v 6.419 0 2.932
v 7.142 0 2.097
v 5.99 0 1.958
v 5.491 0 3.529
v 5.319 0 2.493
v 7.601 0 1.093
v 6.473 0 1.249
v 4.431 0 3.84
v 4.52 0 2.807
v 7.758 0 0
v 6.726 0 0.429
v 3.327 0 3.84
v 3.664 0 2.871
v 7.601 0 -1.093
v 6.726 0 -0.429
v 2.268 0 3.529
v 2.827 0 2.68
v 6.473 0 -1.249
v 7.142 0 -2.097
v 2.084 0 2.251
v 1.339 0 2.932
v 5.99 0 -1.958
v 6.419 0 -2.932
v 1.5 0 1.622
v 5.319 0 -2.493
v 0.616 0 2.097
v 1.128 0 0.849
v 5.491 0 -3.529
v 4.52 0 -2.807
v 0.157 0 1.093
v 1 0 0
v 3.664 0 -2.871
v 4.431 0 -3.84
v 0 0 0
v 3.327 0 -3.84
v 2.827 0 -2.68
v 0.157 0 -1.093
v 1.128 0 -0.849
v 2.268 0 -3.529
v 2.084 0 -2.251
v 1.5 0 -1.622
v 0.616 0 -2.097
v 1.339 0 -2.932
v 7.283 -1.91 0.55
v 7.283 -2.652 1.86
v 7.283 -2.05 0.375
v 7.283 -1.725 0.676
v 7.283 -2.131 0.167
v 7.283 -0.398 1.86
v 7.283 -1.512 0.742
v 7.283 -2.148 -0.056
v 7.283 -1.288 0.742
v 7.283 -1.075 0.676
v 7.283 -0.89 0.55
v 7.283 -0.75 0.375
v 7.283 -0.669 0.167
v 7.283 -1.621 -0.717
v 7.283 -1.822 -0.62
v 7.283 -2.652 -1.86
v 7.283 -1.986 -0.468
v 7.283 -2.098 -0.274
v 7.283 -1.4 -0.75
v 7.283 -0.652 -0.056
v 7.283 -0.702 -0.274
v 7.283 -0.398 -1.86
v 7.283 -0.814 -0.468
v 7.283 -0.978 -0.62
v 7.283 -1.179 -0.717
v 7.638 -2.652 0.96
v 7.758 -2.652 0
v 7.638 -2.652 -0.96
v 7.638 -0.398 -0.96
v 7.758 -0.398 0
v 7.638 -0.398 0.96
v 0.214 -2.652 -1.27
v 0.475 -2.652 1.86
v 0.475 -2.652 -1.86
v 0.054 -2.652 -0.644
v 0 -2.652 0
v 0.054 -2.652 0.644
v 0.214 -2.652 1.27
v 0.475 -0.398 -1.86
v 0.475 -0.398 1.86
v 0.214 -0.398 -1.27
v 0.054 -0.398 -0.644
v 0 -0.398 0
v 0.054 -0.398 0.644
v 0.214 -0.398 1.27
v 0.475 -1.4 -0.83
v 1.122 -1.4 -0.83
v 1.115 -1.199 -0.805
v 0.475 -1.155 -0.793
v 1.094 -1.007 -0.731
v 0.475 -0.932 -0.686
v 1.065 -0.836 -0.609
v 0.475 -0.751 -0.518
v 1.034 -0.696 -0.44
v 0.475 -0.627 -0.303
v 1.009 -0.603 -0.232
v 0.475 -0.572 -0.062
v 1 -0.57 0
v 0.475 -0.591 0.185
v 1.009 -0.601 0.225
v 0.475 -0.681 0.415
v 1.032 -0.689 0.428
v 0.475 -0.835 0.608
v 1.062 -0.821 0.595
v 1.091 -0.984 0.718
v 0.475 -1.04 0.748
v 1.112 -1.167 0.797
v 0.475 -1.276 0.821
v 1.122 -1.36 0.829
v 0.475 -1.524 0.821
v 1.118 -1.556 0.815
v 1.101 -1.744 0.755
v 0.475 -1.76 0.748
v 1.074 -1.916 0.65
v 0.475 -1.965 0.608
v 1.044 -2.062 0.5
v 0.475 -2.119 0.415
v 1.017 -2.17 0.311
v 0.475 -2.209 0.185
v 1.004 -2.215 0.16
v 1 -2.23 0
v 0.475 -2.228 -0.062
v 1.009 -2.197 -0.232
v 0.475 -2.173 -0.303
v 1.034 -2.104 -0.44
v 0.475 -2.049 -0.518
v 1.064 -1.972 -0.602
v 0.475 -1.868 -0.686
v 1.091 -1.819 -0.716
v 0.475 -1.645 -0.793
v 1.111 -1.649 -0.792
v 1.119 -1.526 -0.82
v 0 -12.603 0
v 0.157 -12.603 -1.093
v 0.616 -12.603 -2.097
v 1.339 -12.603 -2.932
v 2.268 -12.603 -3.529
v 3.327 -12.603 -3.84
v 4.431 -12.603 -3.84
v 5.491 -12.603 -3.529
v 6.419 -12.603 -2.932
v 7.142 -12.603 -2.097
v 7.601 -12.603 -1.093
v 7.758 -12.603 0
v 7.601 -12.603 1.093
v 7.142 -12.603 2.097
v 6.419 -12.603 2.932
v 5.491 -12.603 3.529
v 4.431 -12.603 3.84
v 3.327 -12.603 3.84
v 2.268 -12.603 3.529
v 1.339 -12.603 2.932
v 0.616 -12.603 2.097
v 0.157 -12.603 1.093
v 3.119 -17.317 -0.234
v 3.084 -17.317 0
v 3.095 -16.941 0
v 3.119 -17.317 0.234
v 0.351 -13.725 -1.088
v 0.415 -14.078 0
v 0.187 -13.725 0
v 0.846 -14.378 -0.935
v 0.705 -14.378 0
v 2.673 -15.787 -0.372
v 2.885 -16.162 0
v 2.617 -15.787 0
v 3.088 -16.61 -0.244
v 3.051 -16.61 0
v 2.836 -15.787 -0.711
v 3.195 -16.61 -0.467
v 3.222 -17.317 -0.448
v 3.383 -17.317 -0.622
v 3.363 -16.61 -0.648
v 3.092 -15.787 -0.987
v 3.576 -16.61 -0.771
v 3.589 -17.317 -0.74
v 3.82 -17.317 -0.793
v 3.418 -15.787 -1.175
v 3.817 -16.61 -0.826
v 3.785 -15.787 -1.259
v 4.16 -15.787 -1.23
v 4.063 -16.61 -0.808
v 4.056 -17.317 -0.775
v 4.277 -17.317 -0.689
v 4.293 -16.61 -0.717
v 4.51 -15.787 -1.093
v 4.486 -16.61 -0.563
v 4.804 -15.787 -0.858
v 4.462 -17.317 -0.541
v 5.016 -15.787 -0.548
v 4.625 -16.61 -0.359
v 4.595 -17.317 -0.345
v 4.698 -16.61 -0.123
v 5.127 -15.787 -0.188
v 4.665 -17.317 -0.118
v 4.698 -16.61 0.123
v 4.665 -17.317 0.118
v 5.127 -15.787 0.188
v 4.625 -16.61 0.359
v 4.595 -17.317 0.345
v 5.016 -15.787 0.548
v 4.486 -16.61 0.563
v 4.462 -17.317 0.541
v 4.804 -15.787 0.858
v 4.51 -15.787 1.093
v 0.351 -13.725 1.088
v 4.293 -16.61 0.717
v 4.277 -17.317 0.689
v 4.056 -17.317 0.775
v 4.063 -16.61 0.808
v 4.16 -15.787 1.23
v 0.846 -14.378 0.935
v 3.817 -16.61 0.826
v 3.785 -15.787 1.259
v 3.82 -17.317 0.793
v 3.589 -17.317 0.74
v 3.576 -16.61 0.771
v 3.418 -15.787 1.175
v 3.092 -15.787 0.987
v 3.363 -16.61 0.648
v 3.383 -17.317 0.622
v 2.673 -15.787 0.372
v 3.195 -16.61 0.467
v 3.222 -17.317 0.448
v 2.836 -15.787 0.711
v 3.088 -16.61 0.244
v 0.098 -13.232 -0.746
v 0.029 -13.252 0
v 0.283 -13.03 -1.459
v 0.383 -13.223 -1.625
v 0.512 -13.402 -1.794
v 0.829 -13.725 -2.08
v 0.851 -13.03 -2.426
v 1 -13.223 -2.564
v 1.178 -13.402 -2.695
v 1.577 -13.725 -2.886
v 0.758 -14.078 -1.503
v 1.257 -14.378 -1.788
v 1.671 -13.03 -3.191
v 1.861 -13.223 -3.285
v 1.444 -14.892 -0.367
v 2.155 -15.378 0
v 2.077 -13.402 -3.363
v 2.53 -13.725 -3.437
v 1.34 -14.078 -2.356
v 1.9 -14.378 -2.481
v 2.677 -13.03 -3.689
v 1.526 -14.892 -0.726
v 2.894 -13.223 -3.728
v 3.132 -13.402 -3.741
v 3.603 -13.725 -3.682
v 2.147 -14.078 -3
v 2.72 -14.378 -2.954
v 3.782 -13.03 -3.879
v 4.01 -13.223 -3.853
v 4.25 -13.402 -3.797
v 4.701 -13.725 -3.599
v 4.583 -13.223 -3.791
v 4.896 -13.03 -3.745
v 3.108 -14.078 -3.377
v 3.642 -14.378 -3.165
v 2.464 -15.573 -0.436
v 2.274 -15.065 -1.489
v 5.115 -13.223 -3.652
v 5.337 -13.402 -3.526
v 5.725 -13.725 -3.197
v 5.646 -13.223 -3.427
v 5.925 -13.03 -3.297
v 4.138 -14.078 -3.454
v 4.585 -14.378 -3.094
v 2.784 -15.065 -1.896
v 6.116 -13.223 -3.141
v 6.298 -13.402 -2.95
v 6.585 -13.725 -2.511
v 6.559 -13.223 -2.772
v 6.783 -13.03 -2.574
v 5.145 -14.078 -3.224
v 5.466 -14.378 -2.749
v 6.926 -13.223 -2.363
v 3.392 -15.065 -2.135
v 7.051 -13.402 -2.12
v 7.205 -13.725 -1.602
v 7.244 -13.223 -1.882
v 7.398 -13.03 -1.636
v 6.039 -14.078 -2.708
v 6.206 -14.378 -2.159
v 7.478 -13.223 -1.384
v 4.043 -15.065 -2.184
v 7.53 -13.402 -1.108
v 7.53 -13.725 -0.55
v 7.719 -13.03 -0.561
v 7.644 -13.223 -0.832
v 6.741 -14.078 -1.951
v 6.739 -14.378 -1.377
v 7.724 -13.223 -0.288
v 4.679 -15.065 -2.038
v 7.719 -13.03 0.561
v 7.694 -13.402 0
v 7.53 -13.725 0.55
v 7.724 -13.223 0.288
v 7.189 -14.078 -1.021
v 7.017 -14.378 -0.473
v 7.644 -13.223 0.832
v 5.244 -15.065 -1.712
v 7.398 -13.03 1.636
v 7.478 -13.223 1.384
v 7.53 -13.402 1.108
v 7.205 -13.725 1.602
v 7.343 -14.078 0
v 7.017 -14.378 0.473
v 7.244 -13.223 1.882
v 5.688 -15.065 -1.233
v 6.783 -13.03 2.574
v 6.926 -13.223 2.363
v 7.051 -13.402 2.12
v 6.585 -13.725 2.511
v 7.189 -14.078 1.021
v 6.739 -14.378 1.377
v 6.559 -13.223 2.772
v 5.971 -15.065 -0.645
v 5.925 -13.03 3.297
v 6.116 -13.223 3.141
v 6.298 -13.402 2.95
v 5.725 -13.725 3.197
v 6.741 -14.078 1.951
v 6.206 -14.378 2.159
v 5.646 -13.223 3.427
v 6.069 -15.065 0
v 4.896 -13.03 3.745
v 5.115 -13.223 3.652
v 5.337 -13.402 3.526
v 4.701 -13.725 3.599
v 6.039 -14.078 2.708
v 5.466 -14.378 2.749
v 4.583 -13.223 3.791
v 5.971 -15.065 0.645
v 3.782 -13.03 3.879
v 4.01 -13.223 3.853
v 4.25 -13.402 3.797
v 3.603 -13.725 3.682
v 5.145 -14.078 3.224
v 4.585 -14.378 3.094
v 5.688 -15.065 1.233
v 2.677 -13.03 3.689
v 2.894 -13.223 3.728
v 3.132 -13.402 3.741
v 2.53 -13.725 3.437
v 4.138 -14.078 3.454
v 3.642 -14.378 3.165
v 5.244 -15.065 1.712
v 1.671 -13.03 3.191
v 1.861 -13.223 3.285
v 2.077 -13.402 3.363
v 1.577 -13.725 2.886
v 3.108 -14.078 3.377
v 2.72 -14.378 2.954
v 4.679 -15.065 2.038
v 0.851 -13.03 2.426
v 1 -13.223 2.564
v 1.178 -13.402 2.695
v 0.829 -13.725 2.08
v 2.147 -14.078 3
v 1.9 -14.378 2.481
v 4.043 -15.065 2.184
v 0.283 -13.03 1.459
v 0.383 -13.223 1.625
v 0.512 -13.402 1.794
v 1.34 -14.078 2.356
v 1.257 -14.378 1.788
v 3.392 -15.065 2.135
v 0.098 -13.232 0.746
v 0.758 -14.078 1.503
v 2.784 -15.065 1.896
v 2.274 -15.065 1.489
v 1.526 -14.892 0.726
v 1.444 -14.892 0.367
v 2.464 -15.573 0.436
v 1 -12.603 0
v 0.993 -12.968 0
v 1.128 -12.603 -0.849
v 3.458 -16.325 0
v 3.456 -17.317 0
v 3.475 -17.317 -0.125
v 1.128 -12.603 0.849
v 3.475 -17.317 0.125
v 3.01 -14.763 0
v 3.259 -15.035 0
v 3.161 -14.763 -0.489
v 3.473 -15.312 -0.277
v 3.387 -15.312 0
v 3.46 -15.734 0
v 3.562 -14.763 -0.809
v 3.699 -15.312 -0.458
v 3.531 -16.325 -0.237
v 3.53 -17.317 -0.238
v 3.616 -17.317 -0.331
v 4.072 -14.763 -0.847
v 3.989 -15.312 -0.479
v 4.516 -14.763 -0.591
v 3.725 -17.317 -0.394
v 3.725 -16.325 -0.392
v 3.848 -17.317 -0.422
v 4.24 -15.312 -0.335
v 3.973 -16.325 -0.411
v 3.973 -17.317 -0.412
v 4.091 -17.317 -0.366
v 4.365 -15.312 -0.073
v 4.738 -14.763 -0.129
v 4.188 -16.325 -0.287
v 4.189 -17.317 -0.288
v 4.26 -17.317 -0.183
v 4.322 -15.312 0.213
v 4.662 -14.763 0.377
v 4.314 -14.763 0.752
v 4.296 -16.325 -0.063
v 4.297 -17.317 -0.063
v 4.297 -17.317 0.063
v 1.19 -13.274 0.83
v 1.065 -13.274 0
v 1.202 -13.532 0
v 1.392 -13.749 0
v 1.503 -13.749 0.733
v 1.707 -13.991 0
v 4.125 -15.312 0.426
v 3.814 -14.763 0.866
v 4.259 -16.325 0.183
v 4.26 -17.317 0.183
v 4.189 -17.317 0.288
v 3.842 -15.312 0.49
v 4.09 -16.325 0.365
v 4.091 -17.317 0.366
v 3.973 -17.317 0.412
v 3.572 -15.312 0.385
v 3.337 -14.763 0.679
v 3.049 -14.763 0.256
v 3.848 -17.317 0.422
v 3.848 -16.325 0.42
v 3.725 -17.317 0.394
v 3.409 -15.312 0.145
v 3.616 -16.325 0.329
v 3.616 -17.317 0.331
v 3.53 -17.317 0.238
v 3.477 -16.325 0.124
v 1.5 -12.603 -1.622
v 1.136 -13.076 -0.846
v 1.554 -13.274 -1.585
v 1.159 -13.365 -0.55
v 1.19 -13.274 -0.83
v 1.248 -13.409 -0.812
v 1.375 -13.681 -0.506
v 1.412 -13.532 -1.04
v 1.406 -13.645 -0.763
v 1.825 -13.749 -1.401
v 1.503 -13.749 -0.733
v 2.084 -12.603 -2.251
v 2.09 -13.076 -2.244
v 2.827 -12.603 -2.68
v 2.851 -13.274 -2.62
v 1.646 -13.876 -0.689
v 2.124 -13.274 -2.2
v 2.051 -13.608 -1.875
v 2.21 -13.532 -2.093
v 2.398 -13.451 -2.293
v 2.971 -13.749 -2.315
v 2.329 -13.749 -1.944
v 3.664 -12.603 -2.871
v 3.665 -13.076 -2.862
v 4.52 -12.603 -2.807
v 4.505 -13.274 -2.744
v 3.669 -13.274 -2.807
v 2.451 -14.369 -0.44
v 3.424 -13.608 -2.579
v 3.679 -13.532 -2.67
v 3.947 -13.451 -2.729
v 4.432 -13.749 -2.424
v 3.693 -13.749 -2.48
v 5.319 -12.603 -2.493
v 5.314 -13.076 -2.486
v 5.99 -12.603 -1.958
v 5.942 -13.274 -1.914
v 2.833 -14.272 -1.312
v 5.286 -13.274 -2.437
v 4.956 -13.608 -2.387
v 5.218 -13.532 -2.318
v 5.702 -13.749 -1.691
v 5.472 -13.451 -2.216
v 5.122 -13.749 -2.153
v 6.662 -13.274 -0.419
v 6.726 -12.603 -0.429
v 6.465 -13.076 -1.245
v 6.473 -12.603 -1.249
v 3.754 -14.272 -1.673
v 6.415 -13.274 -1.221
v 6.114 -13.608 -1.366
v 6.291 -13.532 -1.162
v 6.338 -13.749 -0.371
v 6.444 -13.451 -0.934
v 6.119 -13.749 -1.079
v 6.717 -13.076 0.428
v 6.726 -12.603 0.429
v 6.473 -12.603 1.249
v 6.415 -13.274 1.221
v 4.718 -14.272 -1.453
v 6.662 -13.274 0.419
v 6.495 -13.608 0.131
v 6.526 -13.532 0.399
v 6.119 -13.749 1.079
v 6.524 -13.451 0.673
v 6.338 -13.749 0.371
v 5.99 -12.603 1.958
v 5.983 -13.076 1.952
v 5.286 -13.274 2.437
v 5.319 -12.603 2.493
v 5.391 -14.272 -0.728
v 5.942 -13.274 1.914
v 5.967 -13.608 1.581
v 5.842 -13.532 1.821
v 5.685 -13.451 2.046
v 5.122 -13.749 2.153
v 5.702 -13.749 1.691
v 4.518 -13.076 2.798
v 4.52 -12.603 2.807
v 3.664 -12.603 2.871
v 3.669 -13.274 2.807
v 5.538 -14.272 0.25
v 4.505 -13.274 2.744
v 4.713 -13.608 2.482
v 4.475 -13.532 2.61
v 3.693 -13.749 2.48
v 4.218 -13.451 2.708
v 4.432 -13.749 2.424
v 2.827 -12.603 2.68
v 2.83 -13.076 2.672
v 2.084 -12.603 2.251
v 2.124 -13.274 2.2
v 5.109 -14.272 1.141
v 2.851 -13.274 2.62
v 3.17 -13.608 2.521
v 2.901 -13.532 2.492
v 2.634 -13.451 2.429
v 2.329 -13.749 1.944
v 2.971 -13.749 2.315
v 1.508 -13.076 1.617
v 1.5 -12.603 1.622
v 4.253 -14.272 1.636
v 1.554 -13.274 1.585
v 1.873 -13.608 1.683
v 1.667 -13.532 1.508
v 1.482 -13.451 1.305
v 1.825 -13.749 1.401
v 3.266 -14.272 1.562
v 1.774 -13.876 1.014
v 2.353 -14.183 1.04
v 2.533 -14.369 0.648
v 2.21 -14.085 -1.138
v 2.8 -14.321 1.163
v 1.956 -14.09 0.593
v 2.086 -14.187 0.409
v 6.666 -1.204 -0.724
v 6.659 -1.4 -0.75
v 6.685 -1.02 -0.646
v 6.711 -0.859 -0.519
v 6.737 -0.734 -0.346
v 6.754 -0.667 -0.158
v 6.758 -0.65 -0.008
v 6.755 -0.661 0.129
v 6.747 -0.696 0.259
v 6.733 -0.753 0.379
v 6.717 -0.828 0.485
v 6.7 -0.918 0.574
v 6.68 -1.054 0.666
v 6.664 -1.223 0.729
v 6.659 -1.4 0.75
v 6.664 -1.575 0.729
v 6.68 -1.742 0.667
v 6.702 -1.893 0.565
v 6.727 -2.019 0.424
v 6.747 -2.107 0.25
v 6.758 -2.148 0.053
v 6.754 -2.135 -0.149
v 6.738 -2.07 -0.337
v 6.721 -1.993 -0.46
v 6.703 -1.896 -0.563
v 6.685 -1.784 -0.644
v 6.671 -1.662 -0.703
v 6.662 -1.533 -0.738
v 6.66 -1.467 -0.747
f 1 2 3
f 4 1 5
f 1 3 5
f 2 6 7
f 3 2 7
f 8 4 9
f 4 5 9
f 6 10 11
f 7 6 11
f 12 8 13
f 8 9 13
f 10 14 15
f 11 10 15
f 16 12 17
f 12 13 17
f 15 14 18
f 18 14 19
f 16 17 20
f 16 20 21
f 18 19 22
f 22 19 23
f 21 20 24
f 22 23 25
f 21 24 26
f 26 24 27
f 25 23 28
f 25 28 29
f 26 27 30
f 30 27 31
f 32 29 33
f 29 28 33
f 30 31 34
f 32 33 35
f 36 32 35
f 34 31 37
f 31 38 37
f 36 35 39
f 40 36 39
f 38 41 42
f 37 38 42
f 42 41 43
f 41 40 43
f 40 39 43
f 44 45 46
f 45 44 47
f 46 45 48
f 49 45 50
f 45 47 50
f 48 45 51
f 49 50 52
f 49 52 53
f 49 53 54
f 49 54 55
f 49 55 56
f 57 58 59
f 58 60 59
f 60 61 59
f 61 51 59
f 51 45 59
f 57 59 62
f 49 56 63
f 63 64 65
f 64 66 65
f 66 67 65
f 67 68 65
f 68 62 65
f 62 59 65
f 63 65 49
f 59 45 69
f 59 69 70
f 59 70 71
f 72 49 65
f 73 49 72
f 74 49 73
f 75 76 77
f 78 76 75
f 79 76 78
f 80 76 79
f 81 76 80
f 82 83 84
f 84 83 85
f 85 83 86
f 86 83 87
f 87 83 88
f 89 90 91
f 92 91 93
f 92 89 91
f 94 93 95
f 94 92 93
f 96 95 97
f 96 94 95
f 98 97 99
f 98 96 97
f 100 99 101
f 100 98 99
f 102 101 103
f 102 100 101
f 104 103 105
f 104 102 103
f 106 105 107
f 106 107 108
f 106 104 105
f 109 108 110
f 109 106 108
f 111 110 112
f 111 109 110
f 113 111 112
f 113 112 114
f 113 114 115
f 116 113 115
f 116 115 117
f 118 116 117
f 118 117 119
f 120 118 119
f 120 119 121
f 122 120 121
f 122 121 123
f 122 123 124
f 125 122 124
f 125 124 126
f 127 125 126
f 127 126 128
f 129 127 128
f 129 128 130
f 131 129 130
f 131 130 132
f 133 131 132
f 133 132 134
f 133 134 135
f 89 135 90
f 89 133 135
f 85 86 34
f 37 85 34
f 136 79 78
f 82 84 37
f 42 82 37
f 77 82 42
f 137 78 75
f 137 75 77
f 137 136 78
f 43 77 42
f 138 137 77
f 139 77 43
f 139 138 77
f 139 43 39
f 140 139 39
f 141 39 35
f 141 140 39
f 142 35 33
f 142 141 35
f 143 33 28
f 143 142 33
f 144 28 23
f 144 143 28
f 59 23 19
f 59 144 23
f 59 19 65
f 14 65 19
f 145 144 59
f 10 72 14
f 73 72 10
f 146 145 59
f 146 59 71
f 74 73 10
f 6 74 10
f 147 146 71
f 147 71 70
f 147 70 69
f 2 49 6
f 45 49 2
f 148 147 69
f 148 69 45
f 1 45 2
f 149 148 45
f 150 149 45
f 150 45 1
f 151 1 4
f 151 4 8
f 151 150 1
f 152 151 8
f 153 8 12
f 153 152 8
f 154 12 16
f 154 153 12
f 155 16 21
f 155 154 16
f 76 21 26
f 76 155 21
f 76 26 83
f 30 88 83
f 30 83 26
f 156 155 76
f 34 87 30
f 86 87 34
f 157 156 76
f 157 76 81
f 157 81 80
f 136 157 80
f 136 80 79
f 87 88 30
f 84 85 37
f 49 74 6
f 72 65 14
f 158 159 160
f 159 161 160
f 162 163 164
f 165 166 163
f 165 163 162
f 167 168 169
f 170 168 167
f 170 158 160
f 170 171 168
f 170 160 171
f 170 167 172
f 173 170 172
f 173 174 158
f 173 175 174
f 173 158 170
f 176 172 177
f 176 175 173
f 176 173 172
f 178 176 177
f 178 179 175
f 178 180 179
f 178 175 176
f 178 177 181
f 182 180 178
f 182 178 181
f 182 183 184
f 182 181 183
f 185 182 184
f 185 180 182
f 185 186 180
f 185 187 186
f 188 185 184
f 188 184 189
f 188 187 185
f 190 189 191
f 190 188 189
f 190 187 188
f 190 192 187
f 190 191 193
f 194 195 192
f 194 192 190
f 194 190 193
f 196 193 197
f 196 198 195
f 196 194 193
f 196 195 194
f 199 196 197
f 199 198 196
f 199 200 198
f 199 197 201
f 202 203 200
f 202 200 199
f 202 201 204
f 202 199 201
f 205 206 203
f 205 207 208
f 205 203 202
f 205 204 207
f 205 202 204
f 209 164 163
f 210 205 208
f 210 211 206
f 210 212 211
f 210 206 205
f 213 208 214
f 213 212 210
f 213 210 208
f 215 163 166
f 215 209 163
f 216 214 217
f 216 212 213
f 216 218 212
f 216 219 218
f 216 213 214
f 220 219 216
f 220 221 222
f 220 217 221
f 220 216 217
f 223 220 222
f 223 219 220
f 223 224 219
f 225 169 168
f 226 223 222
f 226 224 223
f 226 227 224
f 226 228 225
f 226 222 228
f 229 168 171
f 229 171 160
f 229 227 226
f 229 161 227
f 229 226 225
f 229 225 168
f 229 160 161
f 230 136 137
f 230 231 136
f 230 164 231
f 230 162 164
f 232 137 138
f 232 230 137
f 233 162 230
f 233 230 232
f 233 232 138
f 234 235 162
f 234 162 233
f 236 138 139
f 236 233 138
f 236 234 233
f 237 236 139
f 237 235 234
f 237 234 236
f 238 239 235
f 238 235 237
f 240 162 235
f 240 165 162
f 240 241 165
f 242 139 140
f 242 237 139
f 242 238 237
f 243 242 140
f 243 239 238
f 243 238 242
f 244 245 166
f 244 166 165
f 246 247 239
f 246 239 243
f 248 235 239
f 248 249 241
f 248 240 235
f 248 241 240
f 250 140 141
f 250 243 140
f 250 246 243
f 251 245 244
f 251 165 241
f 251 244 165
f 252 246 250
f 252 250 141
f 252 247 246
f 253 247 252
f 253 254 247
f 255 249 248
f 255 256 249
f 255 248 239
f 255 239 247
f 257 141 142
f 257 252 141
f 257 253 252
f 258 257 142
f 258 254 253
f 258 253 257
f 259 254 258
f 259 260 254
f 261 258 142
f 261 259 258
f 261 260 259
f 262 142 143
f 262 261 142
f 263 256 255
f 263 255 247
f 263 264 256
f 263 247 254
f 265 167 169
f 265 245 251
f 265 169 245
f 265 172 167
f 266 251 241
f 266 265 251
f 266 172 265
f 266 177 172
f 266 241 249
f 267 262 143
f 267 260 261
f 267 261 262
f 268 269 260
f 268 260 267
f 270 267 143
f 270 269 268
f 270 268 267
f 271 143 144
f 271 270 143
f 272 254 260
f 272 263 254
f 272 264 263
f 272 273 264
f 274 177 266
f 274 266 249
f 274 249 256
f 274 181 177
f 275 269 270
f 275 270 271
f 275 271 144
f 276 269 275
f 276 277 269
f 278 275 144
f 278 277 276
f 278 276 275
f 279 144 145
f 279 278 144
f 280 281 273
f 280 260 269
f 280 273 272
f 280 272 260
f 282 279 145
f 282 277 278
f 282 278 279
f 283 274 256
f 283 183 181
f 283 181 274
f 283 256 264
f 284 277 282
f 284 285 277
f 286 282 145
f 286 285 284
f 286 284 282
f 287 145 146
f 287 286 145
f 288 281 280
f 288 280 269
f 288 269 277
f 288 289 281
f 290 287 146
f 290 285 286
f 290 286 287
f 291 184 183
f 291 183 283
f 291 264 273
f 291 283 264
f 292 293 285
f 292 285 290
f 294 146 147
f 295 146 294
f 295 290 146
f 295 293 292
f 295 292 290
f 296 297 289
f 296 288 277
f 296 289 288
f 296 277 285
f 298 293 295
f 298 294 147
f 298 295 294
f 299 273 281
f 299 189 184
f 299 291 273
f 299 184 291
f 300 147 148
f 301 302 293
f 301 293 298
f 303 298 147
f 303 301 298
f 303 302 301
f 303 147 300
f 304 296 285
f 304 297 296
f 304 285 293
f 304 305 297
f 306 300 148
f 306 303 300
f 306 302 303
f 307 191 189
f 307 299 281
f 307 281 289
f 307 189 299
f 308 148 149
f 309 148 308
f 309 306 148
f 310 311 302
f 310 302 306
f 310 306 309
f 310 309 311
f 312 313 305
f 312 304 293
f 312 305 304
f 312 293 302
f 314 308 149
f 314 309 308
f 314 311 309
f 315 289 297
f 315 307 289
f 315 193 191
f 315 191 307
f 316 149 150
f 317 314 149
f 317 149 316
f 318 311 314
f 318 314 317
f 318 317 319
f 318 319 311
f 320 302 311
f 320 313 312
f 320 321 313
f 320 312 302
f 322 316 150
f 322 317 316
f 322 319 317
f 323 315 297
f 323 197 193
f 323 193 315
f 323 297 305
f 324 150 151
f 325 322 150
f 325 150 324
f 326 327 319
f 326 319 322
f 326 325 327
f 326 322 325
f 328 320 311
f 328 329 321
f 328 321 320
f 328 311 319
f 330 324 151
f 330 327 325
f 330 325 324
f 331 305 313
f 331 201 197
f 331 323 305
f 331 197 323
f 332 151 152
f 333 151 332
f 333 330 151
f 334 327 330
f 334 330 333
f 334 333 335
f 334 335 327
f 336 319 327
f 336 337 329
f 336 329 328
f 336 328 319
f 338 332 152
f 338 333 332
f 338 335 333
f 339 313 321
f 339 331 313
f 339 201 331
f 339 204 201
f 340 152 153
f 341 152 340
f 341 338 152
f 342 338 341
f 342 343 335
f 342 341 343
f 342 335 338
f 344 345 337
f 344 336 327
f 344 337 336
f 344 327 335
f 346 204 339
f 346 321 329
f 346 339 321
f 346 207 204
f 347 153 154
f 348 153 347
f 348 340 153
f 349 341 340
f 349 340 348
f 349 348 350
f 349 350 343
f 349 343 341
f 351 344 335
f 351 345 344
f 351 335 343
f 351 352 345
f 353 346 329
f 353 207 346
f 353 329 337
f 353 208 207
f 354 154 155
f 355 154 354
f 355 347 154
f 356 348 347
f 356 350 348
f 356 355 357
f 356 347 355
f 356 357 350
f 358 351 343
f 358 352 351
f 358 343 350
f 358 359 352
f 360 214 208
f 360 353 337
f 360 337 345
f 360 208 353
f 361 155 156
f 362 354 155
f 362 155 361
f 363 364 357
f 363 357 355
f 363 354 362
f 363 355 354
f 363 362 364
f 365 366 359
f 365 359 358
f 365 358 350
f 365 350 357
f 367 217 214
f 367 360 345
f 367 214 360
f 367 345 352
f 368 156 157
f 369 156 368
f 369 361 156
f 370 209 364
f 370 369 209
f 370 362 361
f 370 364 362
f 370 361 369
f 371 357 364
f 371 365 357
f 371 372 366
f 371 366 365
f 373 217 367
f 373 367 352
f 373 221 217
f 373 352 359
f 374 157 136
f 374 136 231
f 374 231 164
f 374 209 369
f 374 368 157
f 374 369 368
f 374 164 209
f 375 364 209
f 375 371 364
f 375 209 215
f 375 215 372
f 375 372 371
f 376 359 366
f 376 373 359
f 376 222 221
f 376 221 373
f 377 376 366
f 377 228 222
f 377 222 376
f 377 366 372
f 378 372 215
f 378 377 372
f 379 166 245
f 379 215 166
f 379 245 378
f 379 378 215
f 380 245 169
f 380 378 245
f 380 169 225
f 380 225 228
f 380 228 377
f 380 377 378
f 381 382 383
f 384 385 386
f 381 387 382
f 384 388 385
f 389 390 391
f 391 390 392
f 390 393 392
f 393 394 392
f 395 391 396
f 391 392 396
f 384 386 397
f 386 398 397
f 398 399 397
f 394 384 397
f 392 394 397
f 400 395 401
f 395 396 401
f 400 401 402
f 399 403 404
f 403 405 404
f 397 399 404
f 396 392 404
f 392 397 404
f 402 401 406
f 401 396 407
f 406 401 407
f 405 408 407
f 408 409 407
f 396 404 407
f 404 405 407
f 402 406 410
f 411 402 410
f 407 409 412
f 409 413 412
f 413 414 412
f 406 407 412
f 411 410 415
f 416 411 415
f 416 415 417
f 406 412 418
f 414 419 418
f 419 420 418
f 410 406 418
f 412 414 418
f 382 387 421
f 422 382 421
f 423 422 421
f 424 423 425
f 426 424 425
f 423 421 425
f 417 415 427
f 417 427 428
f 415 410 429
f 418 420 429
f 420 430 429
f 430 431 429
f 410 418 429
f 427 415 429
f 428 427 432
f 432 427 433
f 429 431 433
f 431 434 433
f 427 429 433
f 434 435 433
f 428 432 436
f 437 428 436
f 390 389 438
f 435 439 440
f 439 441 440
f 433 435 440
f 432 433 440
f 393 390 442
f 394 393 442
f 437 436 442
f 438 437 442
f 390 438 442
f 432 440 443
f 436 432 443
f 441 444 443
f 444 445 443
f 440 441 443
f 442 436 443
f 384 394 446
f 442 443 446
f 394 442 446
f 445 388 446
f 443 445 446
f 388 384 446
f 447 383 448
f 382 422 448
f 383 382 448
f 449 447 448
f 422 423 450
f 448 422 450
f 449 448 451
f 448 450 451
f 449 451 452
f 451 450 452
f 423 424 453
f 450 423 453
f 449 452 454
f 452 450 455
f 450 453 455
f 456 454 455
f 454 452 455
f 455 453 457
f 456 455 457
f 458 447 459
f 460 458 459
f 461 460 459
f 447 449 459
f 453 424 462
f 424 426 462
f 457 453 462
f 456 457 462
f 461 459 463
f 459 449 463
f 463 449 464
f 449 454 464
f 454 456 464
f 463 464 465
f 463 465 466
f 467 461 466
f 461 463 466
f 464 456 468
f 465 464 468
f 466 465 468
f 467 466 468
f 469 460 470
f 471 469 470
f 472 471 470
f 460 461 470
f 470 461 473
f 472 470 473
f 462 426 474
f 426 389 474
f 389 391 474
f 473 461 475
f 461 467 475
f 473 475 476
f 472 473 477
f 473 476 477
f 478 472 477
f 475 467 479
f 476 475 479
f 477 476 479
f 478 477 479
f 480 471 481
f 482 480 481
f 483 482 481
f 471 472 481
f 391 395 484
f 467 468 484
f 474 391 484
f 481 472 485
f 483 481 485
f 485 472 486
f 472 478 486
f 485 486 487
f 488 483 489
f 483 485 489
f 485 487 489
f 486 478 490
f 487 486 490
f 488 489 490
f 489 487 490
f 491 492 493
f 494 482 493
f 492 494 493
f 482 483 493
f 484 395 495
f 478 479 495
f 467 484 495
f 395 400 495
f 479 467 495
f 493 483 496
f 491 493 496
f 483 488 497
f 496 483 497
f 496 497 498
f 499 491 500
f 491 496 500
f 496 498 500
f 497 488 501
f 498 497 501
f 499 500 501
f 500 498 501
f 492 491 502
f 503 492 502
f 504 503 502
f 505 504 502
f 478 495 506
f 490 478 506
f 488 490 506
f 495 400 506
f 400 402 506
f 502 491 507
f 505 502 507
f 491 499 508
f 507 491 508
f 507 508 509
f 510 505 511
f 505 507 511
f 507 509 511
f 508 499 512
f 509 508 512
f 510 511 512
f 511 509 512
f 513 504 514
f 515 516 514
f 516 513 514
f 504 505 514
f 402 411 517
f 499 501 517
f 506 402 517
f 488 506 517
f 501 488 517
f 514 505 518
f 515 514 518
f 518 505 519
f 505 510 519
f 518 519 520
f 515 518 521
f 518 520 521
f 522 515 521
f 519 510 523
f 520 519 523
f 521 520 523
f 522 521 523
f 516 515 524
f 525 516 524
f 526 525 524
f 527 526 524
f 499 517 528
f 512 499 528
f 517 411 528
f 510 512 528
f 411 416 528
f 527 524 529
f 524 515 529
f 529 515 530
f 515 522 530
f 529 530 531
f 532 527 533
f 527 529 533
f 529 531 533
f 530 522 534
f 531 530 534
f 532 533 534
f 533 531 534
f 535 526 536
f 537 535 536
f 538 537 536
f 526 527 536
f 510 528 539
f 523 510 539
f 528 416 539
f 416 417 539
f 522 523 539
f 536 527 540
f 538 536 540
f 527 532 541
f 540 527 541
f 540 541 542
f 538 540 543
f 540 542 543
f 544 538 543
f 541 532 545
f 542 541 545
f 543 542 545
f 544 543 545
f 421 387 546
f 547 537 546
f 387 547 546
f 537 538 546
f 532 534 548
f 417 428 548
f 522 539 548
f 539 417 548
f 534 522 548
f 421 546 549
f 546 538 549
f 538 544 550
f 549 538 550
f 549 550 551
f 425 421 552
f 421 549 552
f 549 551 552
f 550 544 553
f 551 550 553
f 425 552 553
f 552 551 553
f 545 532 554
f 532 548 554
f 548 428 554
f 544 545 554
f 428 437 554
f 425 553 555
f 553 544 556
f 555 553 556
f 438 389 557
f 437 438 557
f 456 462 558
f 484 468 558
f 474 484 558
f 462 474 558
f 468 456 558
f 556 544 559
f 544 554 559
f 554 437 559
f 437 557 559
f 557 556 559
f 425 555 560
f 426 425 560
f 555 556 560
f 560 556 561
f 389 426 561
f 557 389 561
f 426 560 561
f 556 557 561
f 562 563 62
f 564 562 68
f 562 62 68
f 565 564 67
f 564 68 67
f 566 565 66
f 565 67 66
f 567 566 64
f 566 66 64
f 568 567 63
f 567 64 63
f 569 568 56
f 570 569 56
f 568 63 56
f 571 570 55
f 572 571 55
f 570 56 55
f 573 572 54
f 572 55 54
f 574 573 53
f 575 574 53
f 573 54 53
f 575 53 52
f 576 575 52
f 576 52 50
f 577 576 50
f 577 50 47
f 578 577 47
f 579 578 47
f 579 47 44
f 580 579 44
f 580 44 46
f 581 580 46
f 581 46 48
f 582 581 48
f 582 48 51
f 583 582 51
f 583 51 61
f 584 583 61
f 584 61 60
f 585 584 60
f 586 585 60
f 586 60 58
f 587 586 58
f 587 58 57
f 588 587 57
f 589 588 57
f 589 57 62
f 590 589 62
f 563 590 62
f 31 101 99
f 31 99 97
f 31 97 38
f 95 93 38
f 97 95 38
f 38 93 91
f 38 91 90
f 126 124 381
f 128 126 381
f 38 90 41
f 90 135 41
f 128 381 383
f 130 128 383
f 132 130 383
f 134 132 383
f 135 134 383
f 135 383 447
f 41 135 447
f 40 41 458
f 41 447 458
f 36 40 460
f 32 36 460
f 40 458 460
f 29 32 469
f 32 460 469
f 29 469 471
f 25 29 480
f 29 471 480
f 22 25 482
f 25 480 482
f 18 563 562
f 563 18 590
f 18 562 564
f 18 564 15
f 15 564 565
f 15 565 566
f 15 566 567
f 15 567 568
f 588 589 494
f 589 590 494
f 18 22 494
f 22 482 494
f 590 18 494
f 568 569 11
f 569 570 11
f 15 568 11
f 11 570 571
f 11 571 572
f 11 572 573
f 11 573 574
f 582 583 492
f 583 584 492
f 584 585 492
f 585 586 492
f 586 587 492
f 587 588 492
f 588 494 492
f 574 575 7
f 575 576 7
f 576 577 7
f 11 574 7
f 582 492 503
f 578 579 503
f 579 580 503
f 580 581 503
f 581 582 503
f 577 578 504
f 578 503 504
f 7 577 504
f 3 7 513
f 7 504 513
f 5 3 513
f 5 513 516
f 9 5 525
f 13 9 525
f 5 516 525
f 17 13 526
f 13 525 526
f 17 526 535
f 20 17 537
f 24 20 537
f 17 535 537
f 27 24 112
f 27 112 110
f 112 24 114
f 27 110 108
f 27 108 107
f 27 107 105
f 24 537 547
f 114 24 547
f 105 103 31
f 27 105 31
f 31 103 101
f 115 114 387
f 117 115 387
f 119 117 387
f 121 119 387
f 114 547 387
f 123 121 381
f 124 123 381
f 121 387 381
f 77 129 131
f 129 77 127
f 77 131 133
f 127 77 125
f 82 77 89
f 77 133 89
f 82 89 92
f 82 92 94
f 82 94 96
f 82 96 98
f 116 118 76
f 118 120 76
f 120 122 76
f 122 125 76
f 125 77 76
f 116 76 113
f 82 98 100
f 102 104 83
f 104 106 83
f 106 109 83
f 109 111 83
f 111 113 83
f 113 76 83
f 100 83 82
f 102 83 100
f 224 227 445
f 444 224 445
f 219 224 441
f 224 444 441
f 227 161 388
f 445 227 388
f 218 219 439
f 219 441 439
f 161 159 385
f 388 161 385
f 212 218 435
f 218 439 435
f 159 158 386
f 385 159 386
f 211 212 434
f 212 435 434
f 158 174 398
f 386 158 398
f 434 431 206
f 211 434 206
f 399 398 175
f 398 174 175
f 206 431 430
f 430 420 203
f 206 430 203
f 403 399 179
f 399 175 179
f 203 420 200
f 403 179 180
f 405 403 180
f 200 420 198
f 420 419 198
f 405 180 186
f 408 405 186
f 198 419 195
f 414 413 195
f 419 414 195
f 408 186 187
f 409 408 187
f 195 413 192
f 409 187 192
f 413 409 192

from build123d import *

# Parameters (mm, degrees)
CUT_EXTRUDE1_DEPTH      = 20.373272444
CUT_EXTRUDE1_DEPTH_BACK = 5
SKETCH3_R               = 0.75
SKETCH5_R               = 0.830043706
CUT_EXTRUDE3_DEPTH      = 5
CUT_EXTRUDE4_DEPTH      = 10
CUT_EXTRUDE4_DEPTH_BACK = 10
SKETCH6_W               = 0.475158235
SKETCH6_H               = 2.253950387
SKETCH6_W_2             = 0.475158234


with BuildPart() as part:
    # Sketch1 → Revolve1 (revolve)
    with BuildSketch(Plane.XY):
        with BuildLine():
            Line((0, 0), (1, 0))
            Line((1, 0), (1, -12))
            Line((1, -12), (1, -12.602750297))
            add(Edge.make_bspline(
                [(1, -12.602750297), (0.79843866, -14.189468734), (4.052548494, -14.158592974), (3.356440043, -16.677675858), (3.45632985, -17.31657115)],
                knots=[0, 0, 0, 0, 0.610593848, 1, 1, 1, 1], degree=3))
            Line((3.45632985, -17.31657115), (3.084044258, -17.31657115))
            add(Edge.make_bspline(
                [(0, -12.602750297), (-0.217127131, -15.249179965), (3.341761348, -14.727809166), (3.084044258, -17.31657115)],
                knots=[0, 0, 0, 0, 1, 1, 1, 1], degree=3))
            Line((0, -12.602750297), (0, -12))
            Line((0, -12), (0, 0))
        make_face()
    revolve(axis=Axis((3.879111396, 0, 0), (0, -1, 0)))

    # Sketch3 → Cut-Extrude1 (cut, two sides: drawn at the far end of the back side and taken through both)
    with BuildSketch(Plane(origin=(7.7582228, 0, 0), x_dir=(0, 0, -1), z_dir=(1, 0, 0)).offset(-CUT_EXTRUDE1_DEPTH_BACK)):
        with Locations((0, -1.4)):
            Circle(SKETCH3_R)
    extrude(amount=CUT_EXTRUDE1_DEPTH + CUT_EXTRUDE1_DEPTH_BACK, mode=Mode.SUBTRACT)

    # Sketch5 → Cut-Extrude3 (cut)
    with BuildSketch(Plane(origin=(-0.0208886, 0, 0), x_dir=(0, 0, -1), z_dir=(1, 0, 0))):
        with Locations((0, -1.4)):
            Circle(SKETCH5_R)
    extrude(amount=CUT_EXTRUDE3_DEPTH, mode=Mode.SUBTRACT)

    # Sketch6 → Cut-Extrude4 (cut, two sides: drawn at the far end of the back side and taken through both)
    with BuildSketch(Plane.XY.offset(-CUT_EXTRUDE4_DEPTH_BACK)):
        with Locations((0.237579118, -1.525266711)):
            Rectangle(SKETCH6_W, SKETCH6_H)
        with Locations((7.520643674, -1.525266711)):
            Rectangle(SKETCH6_W_2, SKETCH6_H)
    extrude(amount=CUT_EXTRUDE4_DEPTH + CUT_EXTRUDE4_DEPTH_BACK, mode=Mode.SUBTRACT)


solid = part.part
